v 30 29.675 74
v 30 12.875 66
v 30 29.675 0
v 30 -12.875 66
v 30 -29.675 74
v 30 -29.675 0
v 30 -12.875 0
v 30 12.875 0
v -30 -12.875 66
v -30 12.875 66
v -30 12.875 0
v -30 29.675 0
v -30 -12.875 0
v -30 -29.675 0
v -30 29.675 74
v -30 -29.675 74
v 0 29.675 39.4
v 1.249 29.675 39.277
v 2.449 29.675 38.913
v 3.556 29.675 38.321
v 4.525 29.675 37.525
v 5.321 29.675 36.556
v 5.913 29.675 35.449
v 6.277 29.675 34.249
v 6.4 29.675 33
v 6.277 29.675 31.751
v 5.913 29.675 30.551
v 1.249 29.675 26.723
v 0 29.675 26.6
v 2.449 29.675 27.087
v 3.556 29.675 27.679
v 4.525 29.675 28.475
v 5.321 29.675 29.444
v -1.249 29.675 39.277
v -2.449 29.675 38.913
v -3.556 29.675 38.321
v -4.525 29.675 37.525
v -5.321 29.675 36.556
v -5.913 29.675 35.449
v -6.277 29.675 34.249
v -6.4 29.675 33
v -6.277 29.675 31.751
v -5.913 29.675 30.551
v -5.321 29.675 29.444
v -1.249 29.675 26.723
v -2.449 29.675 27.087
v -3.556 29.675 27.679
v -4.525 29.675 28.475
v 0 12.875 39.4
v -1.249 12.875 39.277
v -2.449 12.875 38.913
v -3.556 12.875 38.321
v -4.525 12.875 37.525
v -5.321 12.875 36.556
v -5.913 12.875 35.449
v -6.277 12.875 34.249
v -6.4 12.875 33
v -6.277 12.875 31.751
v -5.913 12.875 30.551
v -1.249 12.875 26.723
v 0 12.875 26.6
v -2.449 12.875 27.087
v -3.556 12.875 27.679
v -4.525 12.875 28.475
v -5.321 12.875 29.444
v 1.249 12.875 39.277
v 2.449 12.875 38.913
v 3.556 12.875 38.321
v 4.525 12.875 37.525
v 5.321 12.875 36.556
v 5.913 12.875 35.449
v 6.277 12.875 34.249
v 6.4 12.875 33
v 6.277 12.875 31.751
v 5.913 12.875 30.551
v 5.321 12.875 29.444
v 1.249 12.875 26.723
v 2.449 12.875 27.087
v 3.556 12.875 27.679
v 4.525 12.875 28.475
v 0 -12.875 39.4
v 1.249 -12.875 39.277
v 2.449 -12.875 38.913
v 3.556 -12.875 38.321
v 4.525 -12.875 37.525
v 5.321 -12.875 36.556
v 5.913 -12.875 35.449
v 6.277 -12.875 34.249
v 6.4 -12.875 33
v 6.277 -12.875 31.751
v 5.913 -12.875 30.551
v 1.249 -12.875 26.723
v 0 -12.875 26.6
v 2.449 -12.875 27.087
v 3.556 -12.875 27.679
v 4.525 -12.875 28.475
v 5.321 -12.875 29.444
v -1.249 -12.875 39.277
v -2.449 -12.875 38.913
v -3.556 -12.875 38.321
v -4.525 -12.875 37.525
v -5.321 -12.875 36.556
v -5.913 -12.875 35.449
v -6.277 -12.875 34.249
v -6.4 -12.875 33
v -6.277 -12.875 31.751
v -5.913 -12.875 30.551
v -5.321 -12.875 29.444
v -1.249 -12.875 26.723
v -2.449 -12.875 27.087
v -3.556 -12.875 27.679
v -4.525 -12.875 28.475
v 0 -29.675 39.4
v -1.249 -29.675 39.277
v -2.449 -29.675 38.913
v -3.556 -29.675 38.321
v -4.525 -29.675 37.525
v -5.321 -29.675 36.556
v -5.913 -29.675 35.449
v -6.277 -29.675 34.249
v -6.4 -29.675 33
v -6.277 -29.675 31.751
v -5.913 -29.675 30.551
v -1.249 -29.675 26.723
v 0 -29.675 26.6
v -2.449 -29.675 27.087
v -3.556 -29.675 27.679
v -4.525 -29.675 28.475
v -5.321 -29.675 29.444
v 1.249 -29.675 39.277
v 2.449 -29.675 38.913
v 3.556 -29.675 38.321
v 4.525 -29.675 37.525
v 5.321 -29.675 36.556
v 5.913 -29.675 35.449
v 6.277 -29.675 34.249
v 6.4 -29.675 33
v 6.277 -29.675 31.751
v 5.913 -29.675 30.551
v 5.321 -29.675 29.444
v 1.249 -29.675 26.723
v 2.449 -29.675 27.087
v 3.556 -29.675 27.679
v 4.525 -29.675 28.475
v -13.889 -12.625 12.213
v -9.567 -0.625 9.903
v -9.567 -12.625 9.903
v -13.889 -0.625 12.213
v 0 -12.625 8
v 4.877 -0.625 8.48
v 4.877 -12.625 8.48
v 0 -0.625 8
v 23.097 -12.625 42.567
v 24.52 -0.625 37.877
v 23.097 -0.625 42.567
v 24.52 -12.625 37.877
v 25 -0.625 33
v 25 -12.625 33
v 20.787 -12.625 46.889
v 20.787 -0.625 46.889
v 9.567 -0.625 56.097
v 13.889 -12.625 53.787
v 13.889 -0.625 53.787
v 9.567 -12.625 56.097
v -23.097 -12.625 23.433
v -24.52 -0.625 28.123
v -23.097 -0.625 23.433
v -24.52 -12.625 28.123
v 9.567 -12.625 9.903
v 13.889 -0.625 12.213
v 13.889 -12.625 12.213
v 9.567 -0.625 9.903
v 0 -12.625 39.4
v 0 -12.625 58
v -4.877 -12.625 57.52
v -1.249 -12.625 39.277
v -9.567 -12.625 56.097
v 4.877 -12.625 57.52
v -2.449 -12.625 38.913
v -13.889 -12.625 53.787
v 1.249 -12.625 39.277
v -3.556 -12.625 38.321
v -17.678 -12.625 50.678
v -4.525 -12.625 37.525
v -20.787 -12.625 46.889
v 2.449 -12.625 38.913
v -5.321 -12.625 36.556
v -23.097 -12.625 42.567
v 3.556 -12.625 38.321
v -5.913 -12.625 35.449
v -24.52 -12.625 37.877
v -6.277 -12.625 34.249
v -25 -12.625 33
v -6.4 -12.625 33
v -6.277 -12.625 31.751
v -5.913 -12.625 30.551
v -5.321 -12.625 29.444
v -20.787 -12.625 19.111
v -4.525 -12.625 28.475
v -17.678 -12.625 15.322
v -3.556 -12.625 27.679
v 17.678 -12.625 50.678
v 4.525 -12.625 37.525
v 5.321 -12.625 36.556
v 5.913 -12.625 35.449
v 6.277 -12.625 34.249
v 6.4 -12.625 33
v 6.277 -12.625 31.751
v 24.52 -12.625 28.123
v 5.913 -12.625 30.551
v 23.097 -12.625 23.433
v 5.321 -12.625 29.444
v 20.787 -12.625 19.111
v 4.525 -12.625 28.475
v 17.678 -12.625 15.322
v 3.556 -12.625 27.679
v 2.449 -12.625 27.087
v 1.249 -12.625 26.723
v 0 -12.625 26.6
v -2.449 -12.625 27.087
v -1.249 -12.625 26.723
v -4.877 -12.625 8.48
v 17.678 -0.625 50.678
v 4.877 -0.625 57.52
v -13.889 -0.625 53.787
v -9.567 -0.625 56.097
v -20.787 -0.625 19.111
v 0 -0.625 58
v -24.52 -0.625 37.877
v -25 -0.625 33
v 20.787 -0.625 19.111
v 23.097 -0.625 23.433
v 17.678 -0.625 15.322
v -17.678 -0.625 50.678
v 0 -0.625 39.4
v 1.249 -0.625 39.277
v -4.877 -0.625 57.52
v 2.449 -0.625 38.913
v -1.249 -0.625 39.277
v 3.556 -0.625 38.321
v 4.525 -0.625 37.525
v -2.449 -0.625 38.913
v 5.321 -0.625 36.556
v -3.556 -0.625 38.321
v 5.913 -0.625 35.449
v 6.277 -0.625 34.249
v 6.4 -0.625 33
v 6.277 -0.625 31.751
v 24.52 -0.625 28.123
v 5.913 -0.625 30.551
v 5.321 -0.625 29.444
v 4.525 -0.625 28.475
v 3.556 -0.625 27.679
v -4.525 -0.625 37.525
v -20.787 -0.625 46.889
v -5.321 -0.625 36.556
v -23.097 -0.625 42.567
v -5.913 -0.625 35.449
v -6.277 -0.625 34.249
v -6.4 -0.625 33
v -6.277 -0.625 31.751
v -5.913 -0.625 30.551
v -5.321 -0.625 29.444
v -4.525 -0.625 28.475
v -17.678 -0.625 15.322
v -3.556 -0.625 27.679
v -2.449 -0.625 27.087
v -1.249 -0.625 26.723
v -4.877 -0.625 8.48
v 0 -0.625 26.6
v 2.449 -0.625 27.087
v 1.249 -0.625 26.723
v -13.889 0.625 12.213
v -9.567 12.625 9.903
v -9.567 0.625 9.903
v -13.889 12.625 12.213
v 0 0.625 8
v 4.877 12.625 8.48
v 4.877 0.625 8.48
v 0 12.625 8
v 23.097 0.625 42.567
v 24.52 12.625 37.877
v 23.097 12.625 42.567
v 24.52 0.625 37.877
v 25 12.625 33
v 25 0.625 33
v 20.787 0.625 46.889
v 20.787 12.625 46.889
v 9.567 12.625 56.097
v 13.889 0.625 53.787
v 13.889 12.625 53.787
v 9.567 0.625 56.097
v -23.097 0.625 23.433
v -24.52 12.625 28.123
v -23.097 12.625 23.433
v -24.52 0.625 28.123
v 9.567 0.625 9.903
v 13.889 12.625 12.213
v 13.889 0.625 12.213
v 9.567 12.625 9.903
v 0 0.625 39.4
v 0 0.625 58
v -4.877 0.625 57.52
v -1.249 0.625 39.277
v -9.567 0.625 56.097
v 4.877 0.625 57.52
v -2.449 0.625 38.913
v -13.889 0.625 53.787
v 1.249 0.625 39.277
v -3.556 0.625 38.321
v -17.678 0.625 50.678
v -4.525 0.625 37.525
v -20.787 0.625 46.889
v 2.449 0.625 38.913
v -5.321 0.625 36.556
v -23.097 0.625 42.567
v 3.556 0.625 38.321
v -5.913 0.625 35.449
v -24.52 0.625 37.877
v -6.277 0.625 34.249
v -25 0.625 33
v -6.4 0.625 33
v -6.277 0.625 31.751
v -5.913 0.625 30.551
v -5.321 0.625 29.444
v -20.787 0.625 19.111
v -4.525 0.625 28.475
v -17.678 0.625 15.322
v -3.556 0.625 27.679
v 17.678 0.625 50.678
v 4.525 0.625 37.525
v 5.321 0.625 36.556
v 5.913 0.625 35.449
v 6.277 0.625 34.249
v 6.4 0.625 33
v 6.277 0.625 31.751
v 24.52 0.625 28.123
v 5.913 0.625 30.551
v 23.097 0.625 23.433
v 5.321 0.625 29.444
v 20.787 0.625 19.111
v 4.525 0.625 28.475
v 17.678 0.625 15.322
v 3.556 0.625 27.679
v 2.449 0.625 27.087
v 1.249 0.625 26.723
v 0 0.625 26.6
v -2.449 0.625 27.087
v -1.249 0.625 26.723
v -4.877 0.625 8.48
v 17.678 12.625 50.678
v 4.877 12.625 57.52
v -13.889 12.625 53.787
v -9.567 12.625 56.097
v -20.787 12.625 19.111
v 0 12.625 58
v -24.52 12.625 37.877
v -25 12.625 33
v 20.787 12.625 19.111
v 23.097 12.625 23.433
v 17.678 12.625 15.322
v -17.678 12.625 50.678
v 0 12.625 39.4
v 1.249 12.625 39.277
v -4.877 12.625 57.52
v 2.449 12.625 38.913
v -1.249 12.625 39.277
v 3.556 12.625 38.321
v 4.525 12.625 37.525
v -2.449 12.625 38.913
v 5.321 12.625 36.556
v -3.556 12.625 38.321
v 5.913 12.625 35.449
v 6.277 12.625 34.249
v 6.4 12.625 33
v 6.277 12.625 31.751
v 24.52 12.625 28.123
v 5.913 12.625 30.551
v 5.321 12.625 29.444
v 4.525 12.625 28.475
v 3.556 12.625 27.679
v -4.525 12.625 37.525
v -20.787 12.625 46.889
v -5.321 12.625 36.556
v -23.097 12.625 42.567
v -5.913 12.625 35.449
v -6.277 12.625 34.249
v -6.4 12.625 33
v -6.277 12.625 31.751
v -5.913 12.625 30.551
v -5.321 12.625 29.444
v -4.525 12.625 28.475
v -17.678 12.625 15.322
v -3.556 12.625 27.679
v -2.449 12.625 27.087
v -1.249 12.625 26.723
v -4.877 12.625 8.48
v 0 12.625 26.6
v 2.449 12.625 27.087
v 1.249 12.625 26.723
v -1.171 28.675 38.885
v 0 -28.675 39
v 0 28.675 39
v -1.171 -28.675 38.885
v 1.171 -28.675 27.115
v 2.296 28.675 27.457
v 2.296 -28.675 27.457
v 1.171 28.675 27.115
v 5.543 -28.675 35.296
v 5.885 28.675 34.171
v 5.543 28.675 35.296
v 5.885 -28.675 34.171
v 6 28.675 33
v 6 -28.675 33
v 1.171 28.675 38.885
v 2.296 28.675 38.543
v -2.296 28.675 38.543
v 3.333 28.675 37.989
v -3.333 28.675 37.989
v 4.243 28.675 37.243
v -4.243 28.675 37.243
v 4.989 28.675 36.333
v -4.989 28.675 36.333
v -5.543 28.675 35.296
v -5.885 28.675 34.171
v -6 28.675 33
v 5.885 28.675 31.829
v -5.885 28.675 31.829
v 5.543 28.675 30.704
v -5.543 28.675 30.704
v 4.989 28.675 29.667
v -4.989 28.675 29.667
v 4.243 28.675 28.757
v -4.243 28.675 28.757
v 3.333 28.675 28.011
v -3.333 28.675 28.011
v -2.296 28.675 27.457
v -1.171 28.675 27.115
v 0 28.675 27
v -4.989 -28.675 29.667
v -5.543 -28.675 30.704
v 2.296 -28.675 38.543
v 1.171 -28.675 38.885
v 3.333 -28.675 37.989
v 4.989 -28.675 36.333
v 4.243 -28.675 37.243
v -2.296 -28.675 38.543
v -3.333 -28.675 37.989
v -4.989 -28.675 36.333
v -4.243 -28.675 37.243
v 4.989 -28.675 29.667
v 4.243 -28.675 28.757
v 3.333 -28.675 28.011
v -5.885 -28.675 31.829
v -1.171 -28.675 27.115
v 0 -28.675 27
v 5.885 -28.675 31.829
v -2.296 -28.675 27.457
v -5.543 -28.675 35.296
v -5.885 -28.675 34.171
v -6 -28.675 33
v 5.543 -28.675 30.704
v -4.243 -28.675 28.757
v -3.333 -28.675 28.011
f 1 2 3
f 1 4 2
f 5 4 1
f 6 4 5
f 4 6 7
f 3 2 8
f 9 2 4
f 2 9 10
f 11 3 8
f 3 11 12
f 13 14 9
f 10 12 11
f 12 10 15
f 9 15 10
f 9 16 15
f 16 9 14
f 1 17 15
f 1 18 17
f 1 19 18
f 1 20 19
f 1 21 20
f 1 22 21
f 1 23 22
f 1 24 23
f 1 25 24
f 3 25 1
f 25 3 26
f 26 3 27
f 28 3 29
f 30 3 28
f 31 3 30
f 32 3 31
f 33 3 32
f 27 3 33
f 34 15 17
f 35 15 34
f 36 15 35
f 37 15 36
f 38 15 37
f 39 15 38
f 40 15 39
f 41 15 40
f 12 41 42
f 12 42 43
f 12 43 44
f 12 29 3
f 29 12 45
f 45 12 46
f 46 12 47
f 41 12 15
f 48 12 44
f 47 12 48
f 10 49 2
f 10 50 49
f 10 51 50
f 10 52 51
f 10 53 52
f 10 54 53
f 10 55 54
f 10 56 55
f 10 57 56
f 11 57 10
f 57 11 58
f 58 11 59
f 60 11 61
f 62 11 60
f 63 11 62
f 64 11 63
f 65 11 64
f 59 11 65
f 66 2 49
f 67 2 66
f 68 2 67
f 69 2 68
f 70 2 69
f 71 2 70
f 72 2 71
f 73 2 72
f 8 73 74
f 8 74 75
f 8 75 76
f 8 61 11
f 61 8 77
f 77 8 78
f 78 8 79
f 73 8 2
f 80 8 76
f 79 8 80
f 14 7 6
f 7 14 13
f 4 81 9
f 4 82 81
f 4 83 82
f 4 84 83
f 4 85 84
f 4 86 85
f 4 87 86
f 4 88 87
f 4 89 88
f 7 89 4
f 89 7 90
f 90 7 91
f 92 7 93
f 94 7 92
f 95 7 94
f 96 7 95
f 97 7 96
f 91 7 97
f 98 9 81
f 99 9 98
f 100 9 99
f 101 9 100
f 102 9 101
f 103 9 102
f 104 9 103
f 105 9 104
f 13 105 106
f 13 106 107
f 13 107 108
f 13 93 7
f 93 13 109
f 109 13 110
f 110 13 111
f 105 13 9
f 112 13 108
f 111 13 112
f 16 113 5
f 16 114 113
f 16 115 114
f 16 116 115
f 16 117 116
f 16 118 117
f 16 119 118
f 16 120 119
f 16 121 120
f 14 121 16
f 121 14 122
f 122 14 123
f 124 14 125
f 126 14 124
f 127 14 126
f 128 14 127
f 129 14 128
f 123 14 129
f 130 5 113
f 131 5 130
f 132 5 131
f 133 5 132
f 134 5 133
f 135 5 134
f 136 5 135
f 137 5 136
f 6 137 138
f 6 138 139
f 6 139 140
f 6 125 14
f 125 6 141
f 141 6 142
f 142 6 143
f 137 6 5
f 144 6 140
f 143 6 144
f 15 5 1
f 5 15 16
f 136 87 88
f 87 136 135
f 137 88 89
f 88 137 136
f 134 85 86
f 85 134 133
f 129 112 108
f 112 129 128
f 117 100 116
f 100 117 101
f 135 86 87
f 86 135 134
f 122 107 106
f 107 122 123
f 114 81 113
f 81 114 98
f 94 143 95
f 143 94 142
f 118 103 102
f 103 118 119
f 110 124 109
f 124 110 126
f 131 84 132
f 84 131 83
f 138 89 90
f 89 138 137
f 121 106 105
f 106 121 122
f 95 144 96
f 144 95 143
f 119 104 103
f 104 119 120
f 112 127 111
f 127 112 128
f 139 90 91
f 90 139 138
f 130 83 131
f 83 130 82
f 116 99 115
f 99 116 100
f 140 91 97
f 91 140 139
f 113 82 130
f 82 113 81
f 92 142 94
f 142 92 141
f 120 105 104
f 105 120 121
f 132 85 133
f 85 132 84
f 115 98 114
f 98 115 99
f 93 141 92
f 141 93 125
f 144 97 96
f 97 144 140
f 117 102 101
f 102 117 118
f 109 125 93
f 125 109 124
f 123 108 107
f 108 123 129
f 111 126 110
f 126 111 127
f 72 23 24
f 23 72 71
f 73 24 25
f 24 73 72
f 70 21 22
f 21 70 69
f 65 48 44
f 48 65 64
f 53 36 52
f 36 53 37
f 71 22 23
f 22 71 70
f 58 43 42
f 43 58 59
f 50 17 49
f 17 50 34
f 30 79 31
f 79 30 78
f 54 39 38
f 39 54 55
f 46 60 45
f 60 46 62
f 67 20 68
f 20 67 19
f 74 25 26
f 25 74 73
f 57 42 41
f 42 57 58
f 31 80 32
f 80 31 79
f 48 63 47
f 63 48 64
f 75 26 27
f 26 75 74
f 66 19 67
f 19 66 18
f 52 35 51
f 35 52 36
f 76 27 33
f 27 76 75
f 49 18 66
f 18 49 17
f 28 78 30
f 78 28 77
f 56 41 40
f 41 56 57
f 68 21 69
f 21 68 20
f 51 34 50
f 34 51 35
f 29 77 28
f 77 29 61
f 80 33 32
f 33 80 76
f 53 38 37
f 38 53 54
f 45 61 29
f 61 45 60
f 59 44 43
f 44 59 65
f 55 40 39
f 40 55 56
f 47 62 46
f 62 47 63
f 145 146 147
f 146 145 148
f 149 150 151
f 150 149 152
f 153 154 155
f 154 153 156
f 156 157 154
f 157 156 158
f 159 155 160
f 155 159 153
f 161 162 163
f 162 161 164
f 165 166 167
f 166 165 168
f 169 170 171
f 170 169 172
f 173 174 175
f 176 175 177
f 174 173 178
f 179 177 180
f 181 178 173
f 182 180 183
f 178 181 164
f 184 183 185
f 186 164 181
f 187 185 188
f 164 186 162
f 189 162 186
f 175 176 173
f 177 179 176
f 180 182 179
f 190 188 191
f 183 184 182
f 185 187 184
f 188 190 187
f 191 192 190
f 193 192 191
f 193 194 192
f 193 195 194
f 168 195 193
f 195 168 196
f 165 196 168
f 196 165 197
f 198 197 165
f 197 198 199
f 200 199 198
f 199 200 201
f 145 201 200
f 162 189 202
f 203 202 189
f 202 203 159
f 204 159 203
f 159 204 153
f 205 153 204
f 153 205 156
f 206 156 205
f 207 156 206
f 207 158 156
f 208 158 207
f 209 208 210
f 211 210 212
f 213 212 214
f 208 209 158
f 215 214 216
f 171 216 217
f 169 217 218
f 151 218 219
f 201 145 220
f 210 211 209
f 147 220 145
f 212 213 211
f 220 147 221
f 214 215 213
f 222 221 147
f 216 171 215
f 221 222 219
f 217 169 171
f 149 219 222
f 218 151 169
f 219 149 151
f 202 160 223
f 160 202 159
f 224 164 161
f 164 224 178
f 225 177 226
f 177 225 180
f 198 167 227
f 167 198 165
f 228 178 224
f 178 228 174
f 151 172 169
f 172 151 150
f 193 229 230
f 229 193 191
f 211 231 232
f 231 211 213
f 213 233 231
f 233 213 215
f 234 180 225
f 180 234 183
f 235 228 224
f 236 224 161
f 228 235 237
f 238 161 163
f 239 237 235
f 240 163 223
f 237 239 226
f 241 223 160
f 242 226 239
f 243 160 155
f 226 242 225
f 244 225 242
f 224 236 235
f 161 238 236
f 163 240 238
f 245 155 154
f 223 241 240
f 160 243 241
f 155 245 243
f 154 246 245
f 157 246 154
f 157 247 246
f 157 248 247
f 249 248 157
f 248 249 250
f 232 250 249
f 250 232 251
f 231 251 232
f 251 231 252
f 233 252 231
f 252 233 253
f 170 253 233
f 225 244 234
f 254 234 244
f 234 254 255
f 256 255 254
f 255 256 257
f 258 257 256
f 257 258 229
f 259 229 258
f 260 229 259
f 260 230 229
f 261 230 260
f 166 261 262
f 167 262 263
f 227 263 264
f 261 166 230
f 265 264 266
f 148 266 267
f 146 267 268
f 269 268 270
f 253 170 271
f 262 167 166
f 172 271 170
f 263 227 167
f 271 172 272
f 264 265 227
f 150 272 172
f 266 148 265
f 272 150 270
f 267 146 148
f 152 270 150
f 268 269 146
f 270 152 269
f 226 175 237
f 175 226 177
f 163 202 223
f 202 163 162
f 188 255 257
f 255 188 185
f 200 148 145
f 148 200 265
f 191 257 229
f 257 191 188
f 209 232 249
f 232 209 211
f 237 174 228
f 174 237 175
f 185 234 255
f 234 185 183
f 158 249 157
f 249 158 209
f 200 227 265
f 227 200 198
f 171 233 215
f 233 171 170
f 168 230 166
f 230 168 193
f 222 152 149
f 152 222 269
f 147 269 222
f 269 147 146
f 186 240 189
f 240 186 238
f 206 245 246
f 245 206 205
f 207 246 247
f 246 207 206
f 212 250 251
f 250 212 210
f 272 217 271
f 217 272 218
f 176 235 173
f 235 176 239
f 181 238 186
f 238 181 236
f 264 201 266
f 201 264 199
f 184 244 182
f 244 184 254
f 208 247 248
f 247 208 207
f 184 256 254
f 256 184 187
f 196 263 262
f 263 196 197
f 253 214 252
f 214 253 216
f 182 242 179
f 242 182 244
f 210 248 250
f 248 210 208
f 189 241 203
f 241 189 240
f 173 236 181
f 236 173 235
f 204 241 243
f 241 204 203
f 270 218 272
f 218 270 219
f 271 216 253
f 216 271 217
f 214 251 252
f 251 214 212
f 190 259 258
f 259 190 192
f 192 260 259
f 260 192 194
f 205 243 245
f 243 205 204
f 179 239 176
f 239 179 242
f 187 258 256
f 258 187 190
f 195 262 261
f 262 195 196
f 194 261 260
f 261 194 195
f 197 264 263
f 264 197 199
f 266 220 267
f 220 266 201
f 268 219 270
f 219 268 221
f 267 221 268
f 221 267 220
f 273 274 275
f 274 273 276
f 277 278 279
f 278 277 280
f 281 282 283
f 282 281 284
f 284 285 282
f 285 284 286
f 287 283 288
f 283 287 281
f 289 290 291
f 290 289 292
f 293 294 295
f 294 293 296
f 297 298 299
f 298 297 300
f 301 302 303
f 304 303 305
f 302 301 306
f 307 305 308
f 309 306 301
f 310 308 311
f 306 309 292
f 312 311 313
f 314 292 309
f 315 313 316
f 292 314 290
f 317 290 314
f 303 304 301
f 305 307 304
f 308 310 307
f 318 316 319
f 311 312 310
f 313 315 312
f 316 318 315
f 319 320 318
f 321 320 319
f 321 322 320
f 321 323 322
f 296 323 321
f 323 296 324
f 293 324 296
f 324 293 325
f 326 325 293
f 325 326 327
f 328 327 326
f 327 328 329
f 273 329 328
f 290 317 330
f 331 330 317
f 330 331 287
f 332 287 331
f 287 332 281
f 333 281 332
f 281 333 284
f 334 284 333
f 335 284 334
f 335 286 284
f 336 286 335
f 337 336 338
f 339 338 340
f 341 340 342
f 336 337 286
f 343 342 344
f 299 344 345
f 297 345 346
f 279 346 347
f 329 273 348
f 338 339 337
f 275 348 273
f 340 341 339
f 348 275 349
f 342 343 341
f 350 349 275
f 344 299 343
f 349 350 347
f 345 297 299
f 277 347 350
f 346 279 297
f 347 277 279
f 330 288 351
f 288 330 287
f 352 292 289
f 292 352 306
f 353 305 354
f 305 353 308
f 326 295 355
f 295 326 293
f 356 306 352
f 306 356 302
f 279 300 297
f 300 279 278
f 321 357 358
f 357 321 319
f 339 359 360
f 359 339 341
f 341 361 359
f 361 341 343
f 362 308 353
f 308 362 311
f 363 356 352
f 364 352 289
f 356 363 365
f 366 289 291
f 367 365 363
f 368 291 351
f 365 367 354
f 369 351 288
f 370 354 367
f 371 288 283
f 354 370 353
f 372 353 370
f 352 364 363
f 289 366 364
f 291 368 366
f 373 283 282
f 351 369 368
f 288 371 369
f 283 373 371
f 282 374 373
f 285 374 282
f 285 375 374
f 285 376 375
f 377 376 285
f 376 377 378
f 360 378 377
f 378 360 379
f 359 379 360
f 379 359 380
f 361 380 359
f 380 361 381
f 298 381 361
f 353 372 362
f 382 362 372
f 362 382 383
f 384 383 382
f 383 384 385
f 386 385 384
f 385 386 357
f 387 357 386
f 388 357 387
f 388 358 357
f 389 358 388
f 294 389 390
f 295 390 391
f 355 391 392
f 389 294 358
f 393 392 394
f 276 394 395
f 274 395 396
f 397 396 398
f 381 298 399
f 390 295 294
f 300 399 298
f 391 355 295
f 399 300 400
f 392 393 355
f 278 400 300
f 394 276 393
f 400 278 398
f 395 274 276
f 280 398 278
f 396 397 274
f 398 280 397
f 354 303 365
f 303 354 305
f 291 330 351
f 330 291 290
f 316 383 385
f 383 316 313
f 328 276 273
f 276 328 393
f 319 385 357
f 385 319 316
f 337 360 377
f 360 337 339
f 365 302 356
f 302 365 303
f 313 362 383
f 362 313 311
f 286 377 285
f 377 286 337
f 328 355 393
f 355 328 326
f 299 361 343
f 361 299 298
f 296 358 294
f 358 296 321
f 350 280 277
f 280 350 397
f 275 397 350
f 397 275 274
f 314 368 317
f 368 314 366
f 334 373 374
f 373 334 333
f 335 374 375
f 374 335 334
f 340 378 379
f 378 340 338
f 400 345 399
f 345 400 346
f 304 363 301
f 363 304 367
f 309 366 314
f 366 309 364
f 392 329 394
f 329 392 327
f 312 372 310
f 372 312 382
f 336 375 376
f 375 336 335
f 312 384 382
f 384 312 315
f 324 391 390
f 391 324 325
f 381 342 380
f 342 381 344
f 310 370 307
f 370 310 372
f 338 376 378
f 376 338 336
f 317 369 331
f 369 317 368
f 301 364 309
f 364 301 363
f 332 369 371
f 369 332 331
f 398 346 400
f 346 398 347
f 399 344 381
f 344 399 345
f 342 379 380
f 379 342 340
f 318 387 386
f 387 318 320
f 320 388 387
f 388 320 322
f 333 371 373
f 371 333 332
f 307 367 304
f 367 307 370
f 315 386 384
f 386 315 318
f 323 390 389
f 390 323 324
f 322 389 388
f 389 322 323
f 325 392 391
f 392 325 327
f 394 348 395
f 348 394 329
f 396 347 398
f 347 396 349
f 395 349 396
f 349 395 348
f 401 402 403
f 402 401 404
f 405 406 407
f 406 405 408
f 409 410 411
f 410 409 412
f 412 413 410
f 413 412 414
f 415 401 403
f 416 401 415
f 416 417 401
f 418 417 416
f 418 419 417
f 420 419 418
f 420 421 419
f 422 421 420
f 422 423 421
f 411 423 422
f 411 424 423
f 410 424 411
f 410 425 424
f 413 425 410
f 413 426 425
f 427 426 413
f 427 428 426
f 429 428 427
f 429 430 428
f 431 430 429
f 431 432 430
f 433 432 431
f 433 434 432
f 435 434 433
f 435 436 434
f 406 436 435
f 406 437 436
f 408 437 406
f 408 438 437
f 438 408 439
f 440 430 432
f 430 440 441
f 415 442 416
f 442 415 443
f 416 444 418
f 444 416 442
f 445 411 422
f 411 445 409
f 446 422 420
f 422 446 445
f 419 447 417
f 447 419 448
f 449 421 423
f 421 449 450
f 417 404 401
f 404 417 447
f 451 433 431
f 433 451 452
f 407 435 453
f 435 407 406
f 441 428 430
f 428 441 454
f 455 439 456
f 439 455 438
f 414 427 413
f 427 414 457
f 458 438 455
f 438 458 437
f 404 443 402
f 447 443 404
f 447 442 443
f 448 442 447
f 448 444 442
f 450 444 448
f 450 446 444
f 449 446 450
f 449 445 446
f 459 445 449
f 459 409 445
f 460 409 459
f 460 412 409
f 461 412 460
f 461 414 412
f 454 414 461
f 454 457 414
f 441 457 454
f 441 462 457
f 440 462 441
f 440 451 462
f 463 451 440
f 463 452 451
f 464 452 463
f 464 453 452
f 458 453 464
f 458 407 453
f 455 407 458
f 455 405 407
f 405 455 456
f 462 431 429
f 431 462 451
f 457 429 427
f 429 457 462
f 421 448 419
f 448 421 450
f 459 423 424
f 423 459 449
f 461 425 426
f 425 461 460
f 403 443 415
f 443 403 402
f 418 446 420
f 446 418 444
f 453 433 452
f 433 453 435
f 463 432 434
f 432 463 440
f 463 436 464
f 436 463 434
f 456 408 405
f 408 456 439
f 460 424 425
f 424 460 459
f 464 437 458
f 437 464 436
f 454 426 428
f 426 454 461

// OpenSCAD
$fn = 32;

// ------------------------------------------------------------------------
// Trolley wheel set: wheels d50, fork 66 mm tall
// Every part is its own module, assembly() places every instance.
// ------------------------------------------------------------------------

// --- part 1 ---
module trolley_fork() {
  difference() {
    union() {
      translate([-30, 12.875, 0]) cube([60, 16.8, 66]);
      translate([-30, -29.675, 0]) cube([60, 16.8, 66]);
      translate([-30, -29.675, 66]) cube([60, 59.35, 8]);
    }
    translate([0, -21.275, 33]) rotate([90, 0, 0]) cylinder(h = 18.8, d = 12.8, center = true);
    translate([0, 21.275, 33]) rotate([90, 0, 0]) cylinder(h = 18.8, d = 12.8, center = true);
  }
}

// --- part 2 ---
module trolley_wheel() {
  difference() {
      translate([0, 0, 0]) cylinder(h = 12, d = 50);
      translate([0, 0, -1]) cylinder(h = 14, d = 12.8);
    }
}

// --- part 3 ---
module trolley_axle() {
  translate([0, 0, -28.675]) cylinder(h = 57.35, d = 12);
}

// --- assembly ---
module assembly() {
  color([0.80, 0.24, 0.20]) translate([0, 0, 0]) rotate([0, 0, 0]) trolley_fork();
  color([0.20, 0.45, 0.75]) translate([0, -0.625, 33]) rotate([90, 0, 0]) trolley_wheel();
  color([0.25, 0.62, 0.32]) translate([0, 12.625, 33]) rotate([90, 0, 0]) trolley_wheel();
  color([0.92, 0.70, 0.18]) translate([0, 0, 33]) rotate([90, 0, 0]) trolley_axle();
}

assembly();
